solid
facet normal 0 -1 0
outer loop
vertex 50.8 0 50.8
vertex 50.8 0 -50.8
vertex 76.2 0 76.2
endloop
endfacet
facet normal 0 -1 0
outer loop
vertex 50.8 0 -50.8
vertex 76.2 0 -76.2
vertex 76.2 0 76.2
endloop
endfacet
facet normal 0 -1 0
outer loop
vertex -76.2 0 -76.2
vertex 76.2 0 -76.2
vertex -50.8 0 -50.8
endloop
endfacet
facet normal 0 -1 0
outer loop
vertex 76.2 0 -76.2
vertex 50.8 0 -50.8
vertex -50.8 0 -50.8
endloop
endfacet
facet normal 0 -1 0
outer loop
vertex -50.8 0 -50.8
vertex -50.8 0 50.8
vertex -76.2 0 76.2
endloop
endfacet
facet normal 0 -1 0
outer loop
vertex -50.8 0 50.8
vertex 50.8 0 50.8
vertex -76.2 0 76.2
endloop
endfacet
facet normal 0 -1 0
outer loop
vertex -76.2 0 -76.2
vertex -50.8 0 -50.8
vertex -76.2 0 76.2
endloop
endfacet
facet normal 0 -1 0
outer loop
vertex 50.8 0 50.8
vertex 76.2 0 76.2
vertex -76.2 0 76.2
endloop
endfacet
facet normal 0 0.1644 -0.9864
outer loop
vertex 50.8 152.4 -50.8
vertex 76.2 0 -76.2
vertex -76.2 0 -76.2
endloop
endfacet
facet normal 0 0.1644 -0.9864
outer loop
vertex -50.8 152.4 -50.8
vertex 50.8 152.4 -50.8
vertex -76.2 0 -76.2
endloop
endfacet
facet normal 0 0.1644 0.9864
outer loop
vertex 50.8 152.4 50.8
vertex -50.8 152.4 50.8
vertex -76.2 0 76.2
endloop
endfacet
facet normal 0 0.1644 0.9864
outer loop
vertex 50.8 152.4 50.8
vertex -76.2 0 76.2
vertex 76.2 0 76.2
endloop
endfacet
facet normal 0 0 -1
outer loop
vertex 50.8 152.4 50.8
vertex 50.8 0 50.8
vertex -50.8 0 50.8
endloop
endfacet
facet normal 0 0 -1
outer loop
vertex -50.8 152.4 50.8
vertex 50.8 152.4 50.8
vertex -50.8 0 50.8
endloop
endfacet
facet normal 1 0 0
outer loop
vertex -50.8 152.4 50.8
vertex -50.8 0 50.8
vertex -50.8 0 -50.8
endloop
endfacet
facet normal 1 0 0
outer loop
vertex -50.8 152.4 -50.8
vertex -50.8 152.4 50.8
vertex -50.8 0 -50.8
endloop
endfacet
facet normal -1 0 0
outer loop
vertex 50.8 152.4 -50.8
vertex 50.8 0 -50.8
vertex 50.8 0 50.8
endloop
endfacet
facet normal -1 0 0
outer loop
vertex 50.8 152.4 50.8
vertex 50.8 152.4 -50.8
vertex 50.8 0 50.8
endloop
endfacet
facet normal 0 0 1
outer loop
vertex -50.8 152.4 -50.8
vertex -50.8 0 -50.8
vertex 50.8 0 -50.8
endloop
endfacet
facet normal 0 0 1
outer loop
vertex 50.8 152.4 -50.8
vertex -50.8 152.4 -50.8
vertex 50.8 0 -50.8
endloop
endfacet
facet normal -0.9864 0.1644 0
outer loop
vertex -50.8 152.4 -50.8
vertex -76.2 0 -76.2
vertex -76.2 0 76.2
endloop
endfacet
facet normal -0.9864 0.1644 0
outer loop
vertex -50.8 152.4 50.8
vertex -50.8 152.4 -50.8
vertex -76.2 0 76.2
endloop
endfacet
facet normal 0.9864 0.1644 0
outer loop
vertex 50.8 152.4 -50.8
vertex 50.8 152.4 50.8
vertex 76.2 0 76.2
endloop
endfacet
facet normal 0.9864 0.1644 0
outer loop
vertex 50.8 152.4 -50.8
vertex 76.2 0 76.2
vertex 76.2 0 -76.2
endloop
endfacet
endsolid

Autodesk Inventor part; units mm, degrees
ref_plane "YZ Plane" through (0, 0, 0) normal (1, 0, 0) x (0, 1, 0)
ref_plane "XZ Plane" through (0, 0, 0) normal (0, 1, 0) x (-1, 0, 0)
ref_plane "XY Plane" through (0, 0, 0) normal (0, 0, 1) x (1, 0, 0)
sketch "Sketch1" plane through (0, 0, 0) normal (0, 1, 0) x (-1, 0, 0)
  line L0 (-50.8, 50.8) -> (50.8, 50.8)
  line L1 (50.8, 50.8) -> (50.8, -50.8)
  line L2 (50.8, -50.8) -> (-50.8, -50.8)
  line L3 (-50.8, -50.8) -> (-50.8, 50.8)
  line L4 (-50.8, 50.8) -> (50.8, -50.8) construction
  line L5 (50.8, 50.8) -> (-50.8, -50.8) construction
  line L6 (76.2, -76.2) -> (76.2, 76.2)
  line L7 (76.2, 76.2) -> (-76.2, 76.2)
  line L8 (-76.2, 76.2) -> (-76.2, -76.2)
  line L9 (-76.2, -76.2) -> (76.2, -76.2)
  point P0 (0, 0)
  dimension "d0" = 101.6
  dimension "d1" = 101.6
  dimension "d2" = 25.4
extrude "Extrusion1" add sketch "Sketch1" along normal blind 152.4
chamfer "Chamfer1" distance 25.4 distance2 152.4 1 edges at (0, 152.4, 76.2) measured on face at (-16.9333, 152.4, -67.7333)
chamfer "Chamfer2" distance 25.4 distance2 152.4 1 edges at (76.2, 152.4, -12.6998) measured on face at (-16.9333, 152.4, -67.7333)
chamfer "Chamfer3" distance 25.4 distance2 152.4 1 edges at (-12.6998, 152.4, -76.2) measured on face at (-25.3998, 152.4, -67.7333)
chamfer "Chamfer4" distance 25.4 distance2 152.4 1 edges at (-76.2, 152.4, 0) measured on face at (-67.7333, 152.4, -16.9333)
properties part number "PostBase" material "Iron, Cast"
